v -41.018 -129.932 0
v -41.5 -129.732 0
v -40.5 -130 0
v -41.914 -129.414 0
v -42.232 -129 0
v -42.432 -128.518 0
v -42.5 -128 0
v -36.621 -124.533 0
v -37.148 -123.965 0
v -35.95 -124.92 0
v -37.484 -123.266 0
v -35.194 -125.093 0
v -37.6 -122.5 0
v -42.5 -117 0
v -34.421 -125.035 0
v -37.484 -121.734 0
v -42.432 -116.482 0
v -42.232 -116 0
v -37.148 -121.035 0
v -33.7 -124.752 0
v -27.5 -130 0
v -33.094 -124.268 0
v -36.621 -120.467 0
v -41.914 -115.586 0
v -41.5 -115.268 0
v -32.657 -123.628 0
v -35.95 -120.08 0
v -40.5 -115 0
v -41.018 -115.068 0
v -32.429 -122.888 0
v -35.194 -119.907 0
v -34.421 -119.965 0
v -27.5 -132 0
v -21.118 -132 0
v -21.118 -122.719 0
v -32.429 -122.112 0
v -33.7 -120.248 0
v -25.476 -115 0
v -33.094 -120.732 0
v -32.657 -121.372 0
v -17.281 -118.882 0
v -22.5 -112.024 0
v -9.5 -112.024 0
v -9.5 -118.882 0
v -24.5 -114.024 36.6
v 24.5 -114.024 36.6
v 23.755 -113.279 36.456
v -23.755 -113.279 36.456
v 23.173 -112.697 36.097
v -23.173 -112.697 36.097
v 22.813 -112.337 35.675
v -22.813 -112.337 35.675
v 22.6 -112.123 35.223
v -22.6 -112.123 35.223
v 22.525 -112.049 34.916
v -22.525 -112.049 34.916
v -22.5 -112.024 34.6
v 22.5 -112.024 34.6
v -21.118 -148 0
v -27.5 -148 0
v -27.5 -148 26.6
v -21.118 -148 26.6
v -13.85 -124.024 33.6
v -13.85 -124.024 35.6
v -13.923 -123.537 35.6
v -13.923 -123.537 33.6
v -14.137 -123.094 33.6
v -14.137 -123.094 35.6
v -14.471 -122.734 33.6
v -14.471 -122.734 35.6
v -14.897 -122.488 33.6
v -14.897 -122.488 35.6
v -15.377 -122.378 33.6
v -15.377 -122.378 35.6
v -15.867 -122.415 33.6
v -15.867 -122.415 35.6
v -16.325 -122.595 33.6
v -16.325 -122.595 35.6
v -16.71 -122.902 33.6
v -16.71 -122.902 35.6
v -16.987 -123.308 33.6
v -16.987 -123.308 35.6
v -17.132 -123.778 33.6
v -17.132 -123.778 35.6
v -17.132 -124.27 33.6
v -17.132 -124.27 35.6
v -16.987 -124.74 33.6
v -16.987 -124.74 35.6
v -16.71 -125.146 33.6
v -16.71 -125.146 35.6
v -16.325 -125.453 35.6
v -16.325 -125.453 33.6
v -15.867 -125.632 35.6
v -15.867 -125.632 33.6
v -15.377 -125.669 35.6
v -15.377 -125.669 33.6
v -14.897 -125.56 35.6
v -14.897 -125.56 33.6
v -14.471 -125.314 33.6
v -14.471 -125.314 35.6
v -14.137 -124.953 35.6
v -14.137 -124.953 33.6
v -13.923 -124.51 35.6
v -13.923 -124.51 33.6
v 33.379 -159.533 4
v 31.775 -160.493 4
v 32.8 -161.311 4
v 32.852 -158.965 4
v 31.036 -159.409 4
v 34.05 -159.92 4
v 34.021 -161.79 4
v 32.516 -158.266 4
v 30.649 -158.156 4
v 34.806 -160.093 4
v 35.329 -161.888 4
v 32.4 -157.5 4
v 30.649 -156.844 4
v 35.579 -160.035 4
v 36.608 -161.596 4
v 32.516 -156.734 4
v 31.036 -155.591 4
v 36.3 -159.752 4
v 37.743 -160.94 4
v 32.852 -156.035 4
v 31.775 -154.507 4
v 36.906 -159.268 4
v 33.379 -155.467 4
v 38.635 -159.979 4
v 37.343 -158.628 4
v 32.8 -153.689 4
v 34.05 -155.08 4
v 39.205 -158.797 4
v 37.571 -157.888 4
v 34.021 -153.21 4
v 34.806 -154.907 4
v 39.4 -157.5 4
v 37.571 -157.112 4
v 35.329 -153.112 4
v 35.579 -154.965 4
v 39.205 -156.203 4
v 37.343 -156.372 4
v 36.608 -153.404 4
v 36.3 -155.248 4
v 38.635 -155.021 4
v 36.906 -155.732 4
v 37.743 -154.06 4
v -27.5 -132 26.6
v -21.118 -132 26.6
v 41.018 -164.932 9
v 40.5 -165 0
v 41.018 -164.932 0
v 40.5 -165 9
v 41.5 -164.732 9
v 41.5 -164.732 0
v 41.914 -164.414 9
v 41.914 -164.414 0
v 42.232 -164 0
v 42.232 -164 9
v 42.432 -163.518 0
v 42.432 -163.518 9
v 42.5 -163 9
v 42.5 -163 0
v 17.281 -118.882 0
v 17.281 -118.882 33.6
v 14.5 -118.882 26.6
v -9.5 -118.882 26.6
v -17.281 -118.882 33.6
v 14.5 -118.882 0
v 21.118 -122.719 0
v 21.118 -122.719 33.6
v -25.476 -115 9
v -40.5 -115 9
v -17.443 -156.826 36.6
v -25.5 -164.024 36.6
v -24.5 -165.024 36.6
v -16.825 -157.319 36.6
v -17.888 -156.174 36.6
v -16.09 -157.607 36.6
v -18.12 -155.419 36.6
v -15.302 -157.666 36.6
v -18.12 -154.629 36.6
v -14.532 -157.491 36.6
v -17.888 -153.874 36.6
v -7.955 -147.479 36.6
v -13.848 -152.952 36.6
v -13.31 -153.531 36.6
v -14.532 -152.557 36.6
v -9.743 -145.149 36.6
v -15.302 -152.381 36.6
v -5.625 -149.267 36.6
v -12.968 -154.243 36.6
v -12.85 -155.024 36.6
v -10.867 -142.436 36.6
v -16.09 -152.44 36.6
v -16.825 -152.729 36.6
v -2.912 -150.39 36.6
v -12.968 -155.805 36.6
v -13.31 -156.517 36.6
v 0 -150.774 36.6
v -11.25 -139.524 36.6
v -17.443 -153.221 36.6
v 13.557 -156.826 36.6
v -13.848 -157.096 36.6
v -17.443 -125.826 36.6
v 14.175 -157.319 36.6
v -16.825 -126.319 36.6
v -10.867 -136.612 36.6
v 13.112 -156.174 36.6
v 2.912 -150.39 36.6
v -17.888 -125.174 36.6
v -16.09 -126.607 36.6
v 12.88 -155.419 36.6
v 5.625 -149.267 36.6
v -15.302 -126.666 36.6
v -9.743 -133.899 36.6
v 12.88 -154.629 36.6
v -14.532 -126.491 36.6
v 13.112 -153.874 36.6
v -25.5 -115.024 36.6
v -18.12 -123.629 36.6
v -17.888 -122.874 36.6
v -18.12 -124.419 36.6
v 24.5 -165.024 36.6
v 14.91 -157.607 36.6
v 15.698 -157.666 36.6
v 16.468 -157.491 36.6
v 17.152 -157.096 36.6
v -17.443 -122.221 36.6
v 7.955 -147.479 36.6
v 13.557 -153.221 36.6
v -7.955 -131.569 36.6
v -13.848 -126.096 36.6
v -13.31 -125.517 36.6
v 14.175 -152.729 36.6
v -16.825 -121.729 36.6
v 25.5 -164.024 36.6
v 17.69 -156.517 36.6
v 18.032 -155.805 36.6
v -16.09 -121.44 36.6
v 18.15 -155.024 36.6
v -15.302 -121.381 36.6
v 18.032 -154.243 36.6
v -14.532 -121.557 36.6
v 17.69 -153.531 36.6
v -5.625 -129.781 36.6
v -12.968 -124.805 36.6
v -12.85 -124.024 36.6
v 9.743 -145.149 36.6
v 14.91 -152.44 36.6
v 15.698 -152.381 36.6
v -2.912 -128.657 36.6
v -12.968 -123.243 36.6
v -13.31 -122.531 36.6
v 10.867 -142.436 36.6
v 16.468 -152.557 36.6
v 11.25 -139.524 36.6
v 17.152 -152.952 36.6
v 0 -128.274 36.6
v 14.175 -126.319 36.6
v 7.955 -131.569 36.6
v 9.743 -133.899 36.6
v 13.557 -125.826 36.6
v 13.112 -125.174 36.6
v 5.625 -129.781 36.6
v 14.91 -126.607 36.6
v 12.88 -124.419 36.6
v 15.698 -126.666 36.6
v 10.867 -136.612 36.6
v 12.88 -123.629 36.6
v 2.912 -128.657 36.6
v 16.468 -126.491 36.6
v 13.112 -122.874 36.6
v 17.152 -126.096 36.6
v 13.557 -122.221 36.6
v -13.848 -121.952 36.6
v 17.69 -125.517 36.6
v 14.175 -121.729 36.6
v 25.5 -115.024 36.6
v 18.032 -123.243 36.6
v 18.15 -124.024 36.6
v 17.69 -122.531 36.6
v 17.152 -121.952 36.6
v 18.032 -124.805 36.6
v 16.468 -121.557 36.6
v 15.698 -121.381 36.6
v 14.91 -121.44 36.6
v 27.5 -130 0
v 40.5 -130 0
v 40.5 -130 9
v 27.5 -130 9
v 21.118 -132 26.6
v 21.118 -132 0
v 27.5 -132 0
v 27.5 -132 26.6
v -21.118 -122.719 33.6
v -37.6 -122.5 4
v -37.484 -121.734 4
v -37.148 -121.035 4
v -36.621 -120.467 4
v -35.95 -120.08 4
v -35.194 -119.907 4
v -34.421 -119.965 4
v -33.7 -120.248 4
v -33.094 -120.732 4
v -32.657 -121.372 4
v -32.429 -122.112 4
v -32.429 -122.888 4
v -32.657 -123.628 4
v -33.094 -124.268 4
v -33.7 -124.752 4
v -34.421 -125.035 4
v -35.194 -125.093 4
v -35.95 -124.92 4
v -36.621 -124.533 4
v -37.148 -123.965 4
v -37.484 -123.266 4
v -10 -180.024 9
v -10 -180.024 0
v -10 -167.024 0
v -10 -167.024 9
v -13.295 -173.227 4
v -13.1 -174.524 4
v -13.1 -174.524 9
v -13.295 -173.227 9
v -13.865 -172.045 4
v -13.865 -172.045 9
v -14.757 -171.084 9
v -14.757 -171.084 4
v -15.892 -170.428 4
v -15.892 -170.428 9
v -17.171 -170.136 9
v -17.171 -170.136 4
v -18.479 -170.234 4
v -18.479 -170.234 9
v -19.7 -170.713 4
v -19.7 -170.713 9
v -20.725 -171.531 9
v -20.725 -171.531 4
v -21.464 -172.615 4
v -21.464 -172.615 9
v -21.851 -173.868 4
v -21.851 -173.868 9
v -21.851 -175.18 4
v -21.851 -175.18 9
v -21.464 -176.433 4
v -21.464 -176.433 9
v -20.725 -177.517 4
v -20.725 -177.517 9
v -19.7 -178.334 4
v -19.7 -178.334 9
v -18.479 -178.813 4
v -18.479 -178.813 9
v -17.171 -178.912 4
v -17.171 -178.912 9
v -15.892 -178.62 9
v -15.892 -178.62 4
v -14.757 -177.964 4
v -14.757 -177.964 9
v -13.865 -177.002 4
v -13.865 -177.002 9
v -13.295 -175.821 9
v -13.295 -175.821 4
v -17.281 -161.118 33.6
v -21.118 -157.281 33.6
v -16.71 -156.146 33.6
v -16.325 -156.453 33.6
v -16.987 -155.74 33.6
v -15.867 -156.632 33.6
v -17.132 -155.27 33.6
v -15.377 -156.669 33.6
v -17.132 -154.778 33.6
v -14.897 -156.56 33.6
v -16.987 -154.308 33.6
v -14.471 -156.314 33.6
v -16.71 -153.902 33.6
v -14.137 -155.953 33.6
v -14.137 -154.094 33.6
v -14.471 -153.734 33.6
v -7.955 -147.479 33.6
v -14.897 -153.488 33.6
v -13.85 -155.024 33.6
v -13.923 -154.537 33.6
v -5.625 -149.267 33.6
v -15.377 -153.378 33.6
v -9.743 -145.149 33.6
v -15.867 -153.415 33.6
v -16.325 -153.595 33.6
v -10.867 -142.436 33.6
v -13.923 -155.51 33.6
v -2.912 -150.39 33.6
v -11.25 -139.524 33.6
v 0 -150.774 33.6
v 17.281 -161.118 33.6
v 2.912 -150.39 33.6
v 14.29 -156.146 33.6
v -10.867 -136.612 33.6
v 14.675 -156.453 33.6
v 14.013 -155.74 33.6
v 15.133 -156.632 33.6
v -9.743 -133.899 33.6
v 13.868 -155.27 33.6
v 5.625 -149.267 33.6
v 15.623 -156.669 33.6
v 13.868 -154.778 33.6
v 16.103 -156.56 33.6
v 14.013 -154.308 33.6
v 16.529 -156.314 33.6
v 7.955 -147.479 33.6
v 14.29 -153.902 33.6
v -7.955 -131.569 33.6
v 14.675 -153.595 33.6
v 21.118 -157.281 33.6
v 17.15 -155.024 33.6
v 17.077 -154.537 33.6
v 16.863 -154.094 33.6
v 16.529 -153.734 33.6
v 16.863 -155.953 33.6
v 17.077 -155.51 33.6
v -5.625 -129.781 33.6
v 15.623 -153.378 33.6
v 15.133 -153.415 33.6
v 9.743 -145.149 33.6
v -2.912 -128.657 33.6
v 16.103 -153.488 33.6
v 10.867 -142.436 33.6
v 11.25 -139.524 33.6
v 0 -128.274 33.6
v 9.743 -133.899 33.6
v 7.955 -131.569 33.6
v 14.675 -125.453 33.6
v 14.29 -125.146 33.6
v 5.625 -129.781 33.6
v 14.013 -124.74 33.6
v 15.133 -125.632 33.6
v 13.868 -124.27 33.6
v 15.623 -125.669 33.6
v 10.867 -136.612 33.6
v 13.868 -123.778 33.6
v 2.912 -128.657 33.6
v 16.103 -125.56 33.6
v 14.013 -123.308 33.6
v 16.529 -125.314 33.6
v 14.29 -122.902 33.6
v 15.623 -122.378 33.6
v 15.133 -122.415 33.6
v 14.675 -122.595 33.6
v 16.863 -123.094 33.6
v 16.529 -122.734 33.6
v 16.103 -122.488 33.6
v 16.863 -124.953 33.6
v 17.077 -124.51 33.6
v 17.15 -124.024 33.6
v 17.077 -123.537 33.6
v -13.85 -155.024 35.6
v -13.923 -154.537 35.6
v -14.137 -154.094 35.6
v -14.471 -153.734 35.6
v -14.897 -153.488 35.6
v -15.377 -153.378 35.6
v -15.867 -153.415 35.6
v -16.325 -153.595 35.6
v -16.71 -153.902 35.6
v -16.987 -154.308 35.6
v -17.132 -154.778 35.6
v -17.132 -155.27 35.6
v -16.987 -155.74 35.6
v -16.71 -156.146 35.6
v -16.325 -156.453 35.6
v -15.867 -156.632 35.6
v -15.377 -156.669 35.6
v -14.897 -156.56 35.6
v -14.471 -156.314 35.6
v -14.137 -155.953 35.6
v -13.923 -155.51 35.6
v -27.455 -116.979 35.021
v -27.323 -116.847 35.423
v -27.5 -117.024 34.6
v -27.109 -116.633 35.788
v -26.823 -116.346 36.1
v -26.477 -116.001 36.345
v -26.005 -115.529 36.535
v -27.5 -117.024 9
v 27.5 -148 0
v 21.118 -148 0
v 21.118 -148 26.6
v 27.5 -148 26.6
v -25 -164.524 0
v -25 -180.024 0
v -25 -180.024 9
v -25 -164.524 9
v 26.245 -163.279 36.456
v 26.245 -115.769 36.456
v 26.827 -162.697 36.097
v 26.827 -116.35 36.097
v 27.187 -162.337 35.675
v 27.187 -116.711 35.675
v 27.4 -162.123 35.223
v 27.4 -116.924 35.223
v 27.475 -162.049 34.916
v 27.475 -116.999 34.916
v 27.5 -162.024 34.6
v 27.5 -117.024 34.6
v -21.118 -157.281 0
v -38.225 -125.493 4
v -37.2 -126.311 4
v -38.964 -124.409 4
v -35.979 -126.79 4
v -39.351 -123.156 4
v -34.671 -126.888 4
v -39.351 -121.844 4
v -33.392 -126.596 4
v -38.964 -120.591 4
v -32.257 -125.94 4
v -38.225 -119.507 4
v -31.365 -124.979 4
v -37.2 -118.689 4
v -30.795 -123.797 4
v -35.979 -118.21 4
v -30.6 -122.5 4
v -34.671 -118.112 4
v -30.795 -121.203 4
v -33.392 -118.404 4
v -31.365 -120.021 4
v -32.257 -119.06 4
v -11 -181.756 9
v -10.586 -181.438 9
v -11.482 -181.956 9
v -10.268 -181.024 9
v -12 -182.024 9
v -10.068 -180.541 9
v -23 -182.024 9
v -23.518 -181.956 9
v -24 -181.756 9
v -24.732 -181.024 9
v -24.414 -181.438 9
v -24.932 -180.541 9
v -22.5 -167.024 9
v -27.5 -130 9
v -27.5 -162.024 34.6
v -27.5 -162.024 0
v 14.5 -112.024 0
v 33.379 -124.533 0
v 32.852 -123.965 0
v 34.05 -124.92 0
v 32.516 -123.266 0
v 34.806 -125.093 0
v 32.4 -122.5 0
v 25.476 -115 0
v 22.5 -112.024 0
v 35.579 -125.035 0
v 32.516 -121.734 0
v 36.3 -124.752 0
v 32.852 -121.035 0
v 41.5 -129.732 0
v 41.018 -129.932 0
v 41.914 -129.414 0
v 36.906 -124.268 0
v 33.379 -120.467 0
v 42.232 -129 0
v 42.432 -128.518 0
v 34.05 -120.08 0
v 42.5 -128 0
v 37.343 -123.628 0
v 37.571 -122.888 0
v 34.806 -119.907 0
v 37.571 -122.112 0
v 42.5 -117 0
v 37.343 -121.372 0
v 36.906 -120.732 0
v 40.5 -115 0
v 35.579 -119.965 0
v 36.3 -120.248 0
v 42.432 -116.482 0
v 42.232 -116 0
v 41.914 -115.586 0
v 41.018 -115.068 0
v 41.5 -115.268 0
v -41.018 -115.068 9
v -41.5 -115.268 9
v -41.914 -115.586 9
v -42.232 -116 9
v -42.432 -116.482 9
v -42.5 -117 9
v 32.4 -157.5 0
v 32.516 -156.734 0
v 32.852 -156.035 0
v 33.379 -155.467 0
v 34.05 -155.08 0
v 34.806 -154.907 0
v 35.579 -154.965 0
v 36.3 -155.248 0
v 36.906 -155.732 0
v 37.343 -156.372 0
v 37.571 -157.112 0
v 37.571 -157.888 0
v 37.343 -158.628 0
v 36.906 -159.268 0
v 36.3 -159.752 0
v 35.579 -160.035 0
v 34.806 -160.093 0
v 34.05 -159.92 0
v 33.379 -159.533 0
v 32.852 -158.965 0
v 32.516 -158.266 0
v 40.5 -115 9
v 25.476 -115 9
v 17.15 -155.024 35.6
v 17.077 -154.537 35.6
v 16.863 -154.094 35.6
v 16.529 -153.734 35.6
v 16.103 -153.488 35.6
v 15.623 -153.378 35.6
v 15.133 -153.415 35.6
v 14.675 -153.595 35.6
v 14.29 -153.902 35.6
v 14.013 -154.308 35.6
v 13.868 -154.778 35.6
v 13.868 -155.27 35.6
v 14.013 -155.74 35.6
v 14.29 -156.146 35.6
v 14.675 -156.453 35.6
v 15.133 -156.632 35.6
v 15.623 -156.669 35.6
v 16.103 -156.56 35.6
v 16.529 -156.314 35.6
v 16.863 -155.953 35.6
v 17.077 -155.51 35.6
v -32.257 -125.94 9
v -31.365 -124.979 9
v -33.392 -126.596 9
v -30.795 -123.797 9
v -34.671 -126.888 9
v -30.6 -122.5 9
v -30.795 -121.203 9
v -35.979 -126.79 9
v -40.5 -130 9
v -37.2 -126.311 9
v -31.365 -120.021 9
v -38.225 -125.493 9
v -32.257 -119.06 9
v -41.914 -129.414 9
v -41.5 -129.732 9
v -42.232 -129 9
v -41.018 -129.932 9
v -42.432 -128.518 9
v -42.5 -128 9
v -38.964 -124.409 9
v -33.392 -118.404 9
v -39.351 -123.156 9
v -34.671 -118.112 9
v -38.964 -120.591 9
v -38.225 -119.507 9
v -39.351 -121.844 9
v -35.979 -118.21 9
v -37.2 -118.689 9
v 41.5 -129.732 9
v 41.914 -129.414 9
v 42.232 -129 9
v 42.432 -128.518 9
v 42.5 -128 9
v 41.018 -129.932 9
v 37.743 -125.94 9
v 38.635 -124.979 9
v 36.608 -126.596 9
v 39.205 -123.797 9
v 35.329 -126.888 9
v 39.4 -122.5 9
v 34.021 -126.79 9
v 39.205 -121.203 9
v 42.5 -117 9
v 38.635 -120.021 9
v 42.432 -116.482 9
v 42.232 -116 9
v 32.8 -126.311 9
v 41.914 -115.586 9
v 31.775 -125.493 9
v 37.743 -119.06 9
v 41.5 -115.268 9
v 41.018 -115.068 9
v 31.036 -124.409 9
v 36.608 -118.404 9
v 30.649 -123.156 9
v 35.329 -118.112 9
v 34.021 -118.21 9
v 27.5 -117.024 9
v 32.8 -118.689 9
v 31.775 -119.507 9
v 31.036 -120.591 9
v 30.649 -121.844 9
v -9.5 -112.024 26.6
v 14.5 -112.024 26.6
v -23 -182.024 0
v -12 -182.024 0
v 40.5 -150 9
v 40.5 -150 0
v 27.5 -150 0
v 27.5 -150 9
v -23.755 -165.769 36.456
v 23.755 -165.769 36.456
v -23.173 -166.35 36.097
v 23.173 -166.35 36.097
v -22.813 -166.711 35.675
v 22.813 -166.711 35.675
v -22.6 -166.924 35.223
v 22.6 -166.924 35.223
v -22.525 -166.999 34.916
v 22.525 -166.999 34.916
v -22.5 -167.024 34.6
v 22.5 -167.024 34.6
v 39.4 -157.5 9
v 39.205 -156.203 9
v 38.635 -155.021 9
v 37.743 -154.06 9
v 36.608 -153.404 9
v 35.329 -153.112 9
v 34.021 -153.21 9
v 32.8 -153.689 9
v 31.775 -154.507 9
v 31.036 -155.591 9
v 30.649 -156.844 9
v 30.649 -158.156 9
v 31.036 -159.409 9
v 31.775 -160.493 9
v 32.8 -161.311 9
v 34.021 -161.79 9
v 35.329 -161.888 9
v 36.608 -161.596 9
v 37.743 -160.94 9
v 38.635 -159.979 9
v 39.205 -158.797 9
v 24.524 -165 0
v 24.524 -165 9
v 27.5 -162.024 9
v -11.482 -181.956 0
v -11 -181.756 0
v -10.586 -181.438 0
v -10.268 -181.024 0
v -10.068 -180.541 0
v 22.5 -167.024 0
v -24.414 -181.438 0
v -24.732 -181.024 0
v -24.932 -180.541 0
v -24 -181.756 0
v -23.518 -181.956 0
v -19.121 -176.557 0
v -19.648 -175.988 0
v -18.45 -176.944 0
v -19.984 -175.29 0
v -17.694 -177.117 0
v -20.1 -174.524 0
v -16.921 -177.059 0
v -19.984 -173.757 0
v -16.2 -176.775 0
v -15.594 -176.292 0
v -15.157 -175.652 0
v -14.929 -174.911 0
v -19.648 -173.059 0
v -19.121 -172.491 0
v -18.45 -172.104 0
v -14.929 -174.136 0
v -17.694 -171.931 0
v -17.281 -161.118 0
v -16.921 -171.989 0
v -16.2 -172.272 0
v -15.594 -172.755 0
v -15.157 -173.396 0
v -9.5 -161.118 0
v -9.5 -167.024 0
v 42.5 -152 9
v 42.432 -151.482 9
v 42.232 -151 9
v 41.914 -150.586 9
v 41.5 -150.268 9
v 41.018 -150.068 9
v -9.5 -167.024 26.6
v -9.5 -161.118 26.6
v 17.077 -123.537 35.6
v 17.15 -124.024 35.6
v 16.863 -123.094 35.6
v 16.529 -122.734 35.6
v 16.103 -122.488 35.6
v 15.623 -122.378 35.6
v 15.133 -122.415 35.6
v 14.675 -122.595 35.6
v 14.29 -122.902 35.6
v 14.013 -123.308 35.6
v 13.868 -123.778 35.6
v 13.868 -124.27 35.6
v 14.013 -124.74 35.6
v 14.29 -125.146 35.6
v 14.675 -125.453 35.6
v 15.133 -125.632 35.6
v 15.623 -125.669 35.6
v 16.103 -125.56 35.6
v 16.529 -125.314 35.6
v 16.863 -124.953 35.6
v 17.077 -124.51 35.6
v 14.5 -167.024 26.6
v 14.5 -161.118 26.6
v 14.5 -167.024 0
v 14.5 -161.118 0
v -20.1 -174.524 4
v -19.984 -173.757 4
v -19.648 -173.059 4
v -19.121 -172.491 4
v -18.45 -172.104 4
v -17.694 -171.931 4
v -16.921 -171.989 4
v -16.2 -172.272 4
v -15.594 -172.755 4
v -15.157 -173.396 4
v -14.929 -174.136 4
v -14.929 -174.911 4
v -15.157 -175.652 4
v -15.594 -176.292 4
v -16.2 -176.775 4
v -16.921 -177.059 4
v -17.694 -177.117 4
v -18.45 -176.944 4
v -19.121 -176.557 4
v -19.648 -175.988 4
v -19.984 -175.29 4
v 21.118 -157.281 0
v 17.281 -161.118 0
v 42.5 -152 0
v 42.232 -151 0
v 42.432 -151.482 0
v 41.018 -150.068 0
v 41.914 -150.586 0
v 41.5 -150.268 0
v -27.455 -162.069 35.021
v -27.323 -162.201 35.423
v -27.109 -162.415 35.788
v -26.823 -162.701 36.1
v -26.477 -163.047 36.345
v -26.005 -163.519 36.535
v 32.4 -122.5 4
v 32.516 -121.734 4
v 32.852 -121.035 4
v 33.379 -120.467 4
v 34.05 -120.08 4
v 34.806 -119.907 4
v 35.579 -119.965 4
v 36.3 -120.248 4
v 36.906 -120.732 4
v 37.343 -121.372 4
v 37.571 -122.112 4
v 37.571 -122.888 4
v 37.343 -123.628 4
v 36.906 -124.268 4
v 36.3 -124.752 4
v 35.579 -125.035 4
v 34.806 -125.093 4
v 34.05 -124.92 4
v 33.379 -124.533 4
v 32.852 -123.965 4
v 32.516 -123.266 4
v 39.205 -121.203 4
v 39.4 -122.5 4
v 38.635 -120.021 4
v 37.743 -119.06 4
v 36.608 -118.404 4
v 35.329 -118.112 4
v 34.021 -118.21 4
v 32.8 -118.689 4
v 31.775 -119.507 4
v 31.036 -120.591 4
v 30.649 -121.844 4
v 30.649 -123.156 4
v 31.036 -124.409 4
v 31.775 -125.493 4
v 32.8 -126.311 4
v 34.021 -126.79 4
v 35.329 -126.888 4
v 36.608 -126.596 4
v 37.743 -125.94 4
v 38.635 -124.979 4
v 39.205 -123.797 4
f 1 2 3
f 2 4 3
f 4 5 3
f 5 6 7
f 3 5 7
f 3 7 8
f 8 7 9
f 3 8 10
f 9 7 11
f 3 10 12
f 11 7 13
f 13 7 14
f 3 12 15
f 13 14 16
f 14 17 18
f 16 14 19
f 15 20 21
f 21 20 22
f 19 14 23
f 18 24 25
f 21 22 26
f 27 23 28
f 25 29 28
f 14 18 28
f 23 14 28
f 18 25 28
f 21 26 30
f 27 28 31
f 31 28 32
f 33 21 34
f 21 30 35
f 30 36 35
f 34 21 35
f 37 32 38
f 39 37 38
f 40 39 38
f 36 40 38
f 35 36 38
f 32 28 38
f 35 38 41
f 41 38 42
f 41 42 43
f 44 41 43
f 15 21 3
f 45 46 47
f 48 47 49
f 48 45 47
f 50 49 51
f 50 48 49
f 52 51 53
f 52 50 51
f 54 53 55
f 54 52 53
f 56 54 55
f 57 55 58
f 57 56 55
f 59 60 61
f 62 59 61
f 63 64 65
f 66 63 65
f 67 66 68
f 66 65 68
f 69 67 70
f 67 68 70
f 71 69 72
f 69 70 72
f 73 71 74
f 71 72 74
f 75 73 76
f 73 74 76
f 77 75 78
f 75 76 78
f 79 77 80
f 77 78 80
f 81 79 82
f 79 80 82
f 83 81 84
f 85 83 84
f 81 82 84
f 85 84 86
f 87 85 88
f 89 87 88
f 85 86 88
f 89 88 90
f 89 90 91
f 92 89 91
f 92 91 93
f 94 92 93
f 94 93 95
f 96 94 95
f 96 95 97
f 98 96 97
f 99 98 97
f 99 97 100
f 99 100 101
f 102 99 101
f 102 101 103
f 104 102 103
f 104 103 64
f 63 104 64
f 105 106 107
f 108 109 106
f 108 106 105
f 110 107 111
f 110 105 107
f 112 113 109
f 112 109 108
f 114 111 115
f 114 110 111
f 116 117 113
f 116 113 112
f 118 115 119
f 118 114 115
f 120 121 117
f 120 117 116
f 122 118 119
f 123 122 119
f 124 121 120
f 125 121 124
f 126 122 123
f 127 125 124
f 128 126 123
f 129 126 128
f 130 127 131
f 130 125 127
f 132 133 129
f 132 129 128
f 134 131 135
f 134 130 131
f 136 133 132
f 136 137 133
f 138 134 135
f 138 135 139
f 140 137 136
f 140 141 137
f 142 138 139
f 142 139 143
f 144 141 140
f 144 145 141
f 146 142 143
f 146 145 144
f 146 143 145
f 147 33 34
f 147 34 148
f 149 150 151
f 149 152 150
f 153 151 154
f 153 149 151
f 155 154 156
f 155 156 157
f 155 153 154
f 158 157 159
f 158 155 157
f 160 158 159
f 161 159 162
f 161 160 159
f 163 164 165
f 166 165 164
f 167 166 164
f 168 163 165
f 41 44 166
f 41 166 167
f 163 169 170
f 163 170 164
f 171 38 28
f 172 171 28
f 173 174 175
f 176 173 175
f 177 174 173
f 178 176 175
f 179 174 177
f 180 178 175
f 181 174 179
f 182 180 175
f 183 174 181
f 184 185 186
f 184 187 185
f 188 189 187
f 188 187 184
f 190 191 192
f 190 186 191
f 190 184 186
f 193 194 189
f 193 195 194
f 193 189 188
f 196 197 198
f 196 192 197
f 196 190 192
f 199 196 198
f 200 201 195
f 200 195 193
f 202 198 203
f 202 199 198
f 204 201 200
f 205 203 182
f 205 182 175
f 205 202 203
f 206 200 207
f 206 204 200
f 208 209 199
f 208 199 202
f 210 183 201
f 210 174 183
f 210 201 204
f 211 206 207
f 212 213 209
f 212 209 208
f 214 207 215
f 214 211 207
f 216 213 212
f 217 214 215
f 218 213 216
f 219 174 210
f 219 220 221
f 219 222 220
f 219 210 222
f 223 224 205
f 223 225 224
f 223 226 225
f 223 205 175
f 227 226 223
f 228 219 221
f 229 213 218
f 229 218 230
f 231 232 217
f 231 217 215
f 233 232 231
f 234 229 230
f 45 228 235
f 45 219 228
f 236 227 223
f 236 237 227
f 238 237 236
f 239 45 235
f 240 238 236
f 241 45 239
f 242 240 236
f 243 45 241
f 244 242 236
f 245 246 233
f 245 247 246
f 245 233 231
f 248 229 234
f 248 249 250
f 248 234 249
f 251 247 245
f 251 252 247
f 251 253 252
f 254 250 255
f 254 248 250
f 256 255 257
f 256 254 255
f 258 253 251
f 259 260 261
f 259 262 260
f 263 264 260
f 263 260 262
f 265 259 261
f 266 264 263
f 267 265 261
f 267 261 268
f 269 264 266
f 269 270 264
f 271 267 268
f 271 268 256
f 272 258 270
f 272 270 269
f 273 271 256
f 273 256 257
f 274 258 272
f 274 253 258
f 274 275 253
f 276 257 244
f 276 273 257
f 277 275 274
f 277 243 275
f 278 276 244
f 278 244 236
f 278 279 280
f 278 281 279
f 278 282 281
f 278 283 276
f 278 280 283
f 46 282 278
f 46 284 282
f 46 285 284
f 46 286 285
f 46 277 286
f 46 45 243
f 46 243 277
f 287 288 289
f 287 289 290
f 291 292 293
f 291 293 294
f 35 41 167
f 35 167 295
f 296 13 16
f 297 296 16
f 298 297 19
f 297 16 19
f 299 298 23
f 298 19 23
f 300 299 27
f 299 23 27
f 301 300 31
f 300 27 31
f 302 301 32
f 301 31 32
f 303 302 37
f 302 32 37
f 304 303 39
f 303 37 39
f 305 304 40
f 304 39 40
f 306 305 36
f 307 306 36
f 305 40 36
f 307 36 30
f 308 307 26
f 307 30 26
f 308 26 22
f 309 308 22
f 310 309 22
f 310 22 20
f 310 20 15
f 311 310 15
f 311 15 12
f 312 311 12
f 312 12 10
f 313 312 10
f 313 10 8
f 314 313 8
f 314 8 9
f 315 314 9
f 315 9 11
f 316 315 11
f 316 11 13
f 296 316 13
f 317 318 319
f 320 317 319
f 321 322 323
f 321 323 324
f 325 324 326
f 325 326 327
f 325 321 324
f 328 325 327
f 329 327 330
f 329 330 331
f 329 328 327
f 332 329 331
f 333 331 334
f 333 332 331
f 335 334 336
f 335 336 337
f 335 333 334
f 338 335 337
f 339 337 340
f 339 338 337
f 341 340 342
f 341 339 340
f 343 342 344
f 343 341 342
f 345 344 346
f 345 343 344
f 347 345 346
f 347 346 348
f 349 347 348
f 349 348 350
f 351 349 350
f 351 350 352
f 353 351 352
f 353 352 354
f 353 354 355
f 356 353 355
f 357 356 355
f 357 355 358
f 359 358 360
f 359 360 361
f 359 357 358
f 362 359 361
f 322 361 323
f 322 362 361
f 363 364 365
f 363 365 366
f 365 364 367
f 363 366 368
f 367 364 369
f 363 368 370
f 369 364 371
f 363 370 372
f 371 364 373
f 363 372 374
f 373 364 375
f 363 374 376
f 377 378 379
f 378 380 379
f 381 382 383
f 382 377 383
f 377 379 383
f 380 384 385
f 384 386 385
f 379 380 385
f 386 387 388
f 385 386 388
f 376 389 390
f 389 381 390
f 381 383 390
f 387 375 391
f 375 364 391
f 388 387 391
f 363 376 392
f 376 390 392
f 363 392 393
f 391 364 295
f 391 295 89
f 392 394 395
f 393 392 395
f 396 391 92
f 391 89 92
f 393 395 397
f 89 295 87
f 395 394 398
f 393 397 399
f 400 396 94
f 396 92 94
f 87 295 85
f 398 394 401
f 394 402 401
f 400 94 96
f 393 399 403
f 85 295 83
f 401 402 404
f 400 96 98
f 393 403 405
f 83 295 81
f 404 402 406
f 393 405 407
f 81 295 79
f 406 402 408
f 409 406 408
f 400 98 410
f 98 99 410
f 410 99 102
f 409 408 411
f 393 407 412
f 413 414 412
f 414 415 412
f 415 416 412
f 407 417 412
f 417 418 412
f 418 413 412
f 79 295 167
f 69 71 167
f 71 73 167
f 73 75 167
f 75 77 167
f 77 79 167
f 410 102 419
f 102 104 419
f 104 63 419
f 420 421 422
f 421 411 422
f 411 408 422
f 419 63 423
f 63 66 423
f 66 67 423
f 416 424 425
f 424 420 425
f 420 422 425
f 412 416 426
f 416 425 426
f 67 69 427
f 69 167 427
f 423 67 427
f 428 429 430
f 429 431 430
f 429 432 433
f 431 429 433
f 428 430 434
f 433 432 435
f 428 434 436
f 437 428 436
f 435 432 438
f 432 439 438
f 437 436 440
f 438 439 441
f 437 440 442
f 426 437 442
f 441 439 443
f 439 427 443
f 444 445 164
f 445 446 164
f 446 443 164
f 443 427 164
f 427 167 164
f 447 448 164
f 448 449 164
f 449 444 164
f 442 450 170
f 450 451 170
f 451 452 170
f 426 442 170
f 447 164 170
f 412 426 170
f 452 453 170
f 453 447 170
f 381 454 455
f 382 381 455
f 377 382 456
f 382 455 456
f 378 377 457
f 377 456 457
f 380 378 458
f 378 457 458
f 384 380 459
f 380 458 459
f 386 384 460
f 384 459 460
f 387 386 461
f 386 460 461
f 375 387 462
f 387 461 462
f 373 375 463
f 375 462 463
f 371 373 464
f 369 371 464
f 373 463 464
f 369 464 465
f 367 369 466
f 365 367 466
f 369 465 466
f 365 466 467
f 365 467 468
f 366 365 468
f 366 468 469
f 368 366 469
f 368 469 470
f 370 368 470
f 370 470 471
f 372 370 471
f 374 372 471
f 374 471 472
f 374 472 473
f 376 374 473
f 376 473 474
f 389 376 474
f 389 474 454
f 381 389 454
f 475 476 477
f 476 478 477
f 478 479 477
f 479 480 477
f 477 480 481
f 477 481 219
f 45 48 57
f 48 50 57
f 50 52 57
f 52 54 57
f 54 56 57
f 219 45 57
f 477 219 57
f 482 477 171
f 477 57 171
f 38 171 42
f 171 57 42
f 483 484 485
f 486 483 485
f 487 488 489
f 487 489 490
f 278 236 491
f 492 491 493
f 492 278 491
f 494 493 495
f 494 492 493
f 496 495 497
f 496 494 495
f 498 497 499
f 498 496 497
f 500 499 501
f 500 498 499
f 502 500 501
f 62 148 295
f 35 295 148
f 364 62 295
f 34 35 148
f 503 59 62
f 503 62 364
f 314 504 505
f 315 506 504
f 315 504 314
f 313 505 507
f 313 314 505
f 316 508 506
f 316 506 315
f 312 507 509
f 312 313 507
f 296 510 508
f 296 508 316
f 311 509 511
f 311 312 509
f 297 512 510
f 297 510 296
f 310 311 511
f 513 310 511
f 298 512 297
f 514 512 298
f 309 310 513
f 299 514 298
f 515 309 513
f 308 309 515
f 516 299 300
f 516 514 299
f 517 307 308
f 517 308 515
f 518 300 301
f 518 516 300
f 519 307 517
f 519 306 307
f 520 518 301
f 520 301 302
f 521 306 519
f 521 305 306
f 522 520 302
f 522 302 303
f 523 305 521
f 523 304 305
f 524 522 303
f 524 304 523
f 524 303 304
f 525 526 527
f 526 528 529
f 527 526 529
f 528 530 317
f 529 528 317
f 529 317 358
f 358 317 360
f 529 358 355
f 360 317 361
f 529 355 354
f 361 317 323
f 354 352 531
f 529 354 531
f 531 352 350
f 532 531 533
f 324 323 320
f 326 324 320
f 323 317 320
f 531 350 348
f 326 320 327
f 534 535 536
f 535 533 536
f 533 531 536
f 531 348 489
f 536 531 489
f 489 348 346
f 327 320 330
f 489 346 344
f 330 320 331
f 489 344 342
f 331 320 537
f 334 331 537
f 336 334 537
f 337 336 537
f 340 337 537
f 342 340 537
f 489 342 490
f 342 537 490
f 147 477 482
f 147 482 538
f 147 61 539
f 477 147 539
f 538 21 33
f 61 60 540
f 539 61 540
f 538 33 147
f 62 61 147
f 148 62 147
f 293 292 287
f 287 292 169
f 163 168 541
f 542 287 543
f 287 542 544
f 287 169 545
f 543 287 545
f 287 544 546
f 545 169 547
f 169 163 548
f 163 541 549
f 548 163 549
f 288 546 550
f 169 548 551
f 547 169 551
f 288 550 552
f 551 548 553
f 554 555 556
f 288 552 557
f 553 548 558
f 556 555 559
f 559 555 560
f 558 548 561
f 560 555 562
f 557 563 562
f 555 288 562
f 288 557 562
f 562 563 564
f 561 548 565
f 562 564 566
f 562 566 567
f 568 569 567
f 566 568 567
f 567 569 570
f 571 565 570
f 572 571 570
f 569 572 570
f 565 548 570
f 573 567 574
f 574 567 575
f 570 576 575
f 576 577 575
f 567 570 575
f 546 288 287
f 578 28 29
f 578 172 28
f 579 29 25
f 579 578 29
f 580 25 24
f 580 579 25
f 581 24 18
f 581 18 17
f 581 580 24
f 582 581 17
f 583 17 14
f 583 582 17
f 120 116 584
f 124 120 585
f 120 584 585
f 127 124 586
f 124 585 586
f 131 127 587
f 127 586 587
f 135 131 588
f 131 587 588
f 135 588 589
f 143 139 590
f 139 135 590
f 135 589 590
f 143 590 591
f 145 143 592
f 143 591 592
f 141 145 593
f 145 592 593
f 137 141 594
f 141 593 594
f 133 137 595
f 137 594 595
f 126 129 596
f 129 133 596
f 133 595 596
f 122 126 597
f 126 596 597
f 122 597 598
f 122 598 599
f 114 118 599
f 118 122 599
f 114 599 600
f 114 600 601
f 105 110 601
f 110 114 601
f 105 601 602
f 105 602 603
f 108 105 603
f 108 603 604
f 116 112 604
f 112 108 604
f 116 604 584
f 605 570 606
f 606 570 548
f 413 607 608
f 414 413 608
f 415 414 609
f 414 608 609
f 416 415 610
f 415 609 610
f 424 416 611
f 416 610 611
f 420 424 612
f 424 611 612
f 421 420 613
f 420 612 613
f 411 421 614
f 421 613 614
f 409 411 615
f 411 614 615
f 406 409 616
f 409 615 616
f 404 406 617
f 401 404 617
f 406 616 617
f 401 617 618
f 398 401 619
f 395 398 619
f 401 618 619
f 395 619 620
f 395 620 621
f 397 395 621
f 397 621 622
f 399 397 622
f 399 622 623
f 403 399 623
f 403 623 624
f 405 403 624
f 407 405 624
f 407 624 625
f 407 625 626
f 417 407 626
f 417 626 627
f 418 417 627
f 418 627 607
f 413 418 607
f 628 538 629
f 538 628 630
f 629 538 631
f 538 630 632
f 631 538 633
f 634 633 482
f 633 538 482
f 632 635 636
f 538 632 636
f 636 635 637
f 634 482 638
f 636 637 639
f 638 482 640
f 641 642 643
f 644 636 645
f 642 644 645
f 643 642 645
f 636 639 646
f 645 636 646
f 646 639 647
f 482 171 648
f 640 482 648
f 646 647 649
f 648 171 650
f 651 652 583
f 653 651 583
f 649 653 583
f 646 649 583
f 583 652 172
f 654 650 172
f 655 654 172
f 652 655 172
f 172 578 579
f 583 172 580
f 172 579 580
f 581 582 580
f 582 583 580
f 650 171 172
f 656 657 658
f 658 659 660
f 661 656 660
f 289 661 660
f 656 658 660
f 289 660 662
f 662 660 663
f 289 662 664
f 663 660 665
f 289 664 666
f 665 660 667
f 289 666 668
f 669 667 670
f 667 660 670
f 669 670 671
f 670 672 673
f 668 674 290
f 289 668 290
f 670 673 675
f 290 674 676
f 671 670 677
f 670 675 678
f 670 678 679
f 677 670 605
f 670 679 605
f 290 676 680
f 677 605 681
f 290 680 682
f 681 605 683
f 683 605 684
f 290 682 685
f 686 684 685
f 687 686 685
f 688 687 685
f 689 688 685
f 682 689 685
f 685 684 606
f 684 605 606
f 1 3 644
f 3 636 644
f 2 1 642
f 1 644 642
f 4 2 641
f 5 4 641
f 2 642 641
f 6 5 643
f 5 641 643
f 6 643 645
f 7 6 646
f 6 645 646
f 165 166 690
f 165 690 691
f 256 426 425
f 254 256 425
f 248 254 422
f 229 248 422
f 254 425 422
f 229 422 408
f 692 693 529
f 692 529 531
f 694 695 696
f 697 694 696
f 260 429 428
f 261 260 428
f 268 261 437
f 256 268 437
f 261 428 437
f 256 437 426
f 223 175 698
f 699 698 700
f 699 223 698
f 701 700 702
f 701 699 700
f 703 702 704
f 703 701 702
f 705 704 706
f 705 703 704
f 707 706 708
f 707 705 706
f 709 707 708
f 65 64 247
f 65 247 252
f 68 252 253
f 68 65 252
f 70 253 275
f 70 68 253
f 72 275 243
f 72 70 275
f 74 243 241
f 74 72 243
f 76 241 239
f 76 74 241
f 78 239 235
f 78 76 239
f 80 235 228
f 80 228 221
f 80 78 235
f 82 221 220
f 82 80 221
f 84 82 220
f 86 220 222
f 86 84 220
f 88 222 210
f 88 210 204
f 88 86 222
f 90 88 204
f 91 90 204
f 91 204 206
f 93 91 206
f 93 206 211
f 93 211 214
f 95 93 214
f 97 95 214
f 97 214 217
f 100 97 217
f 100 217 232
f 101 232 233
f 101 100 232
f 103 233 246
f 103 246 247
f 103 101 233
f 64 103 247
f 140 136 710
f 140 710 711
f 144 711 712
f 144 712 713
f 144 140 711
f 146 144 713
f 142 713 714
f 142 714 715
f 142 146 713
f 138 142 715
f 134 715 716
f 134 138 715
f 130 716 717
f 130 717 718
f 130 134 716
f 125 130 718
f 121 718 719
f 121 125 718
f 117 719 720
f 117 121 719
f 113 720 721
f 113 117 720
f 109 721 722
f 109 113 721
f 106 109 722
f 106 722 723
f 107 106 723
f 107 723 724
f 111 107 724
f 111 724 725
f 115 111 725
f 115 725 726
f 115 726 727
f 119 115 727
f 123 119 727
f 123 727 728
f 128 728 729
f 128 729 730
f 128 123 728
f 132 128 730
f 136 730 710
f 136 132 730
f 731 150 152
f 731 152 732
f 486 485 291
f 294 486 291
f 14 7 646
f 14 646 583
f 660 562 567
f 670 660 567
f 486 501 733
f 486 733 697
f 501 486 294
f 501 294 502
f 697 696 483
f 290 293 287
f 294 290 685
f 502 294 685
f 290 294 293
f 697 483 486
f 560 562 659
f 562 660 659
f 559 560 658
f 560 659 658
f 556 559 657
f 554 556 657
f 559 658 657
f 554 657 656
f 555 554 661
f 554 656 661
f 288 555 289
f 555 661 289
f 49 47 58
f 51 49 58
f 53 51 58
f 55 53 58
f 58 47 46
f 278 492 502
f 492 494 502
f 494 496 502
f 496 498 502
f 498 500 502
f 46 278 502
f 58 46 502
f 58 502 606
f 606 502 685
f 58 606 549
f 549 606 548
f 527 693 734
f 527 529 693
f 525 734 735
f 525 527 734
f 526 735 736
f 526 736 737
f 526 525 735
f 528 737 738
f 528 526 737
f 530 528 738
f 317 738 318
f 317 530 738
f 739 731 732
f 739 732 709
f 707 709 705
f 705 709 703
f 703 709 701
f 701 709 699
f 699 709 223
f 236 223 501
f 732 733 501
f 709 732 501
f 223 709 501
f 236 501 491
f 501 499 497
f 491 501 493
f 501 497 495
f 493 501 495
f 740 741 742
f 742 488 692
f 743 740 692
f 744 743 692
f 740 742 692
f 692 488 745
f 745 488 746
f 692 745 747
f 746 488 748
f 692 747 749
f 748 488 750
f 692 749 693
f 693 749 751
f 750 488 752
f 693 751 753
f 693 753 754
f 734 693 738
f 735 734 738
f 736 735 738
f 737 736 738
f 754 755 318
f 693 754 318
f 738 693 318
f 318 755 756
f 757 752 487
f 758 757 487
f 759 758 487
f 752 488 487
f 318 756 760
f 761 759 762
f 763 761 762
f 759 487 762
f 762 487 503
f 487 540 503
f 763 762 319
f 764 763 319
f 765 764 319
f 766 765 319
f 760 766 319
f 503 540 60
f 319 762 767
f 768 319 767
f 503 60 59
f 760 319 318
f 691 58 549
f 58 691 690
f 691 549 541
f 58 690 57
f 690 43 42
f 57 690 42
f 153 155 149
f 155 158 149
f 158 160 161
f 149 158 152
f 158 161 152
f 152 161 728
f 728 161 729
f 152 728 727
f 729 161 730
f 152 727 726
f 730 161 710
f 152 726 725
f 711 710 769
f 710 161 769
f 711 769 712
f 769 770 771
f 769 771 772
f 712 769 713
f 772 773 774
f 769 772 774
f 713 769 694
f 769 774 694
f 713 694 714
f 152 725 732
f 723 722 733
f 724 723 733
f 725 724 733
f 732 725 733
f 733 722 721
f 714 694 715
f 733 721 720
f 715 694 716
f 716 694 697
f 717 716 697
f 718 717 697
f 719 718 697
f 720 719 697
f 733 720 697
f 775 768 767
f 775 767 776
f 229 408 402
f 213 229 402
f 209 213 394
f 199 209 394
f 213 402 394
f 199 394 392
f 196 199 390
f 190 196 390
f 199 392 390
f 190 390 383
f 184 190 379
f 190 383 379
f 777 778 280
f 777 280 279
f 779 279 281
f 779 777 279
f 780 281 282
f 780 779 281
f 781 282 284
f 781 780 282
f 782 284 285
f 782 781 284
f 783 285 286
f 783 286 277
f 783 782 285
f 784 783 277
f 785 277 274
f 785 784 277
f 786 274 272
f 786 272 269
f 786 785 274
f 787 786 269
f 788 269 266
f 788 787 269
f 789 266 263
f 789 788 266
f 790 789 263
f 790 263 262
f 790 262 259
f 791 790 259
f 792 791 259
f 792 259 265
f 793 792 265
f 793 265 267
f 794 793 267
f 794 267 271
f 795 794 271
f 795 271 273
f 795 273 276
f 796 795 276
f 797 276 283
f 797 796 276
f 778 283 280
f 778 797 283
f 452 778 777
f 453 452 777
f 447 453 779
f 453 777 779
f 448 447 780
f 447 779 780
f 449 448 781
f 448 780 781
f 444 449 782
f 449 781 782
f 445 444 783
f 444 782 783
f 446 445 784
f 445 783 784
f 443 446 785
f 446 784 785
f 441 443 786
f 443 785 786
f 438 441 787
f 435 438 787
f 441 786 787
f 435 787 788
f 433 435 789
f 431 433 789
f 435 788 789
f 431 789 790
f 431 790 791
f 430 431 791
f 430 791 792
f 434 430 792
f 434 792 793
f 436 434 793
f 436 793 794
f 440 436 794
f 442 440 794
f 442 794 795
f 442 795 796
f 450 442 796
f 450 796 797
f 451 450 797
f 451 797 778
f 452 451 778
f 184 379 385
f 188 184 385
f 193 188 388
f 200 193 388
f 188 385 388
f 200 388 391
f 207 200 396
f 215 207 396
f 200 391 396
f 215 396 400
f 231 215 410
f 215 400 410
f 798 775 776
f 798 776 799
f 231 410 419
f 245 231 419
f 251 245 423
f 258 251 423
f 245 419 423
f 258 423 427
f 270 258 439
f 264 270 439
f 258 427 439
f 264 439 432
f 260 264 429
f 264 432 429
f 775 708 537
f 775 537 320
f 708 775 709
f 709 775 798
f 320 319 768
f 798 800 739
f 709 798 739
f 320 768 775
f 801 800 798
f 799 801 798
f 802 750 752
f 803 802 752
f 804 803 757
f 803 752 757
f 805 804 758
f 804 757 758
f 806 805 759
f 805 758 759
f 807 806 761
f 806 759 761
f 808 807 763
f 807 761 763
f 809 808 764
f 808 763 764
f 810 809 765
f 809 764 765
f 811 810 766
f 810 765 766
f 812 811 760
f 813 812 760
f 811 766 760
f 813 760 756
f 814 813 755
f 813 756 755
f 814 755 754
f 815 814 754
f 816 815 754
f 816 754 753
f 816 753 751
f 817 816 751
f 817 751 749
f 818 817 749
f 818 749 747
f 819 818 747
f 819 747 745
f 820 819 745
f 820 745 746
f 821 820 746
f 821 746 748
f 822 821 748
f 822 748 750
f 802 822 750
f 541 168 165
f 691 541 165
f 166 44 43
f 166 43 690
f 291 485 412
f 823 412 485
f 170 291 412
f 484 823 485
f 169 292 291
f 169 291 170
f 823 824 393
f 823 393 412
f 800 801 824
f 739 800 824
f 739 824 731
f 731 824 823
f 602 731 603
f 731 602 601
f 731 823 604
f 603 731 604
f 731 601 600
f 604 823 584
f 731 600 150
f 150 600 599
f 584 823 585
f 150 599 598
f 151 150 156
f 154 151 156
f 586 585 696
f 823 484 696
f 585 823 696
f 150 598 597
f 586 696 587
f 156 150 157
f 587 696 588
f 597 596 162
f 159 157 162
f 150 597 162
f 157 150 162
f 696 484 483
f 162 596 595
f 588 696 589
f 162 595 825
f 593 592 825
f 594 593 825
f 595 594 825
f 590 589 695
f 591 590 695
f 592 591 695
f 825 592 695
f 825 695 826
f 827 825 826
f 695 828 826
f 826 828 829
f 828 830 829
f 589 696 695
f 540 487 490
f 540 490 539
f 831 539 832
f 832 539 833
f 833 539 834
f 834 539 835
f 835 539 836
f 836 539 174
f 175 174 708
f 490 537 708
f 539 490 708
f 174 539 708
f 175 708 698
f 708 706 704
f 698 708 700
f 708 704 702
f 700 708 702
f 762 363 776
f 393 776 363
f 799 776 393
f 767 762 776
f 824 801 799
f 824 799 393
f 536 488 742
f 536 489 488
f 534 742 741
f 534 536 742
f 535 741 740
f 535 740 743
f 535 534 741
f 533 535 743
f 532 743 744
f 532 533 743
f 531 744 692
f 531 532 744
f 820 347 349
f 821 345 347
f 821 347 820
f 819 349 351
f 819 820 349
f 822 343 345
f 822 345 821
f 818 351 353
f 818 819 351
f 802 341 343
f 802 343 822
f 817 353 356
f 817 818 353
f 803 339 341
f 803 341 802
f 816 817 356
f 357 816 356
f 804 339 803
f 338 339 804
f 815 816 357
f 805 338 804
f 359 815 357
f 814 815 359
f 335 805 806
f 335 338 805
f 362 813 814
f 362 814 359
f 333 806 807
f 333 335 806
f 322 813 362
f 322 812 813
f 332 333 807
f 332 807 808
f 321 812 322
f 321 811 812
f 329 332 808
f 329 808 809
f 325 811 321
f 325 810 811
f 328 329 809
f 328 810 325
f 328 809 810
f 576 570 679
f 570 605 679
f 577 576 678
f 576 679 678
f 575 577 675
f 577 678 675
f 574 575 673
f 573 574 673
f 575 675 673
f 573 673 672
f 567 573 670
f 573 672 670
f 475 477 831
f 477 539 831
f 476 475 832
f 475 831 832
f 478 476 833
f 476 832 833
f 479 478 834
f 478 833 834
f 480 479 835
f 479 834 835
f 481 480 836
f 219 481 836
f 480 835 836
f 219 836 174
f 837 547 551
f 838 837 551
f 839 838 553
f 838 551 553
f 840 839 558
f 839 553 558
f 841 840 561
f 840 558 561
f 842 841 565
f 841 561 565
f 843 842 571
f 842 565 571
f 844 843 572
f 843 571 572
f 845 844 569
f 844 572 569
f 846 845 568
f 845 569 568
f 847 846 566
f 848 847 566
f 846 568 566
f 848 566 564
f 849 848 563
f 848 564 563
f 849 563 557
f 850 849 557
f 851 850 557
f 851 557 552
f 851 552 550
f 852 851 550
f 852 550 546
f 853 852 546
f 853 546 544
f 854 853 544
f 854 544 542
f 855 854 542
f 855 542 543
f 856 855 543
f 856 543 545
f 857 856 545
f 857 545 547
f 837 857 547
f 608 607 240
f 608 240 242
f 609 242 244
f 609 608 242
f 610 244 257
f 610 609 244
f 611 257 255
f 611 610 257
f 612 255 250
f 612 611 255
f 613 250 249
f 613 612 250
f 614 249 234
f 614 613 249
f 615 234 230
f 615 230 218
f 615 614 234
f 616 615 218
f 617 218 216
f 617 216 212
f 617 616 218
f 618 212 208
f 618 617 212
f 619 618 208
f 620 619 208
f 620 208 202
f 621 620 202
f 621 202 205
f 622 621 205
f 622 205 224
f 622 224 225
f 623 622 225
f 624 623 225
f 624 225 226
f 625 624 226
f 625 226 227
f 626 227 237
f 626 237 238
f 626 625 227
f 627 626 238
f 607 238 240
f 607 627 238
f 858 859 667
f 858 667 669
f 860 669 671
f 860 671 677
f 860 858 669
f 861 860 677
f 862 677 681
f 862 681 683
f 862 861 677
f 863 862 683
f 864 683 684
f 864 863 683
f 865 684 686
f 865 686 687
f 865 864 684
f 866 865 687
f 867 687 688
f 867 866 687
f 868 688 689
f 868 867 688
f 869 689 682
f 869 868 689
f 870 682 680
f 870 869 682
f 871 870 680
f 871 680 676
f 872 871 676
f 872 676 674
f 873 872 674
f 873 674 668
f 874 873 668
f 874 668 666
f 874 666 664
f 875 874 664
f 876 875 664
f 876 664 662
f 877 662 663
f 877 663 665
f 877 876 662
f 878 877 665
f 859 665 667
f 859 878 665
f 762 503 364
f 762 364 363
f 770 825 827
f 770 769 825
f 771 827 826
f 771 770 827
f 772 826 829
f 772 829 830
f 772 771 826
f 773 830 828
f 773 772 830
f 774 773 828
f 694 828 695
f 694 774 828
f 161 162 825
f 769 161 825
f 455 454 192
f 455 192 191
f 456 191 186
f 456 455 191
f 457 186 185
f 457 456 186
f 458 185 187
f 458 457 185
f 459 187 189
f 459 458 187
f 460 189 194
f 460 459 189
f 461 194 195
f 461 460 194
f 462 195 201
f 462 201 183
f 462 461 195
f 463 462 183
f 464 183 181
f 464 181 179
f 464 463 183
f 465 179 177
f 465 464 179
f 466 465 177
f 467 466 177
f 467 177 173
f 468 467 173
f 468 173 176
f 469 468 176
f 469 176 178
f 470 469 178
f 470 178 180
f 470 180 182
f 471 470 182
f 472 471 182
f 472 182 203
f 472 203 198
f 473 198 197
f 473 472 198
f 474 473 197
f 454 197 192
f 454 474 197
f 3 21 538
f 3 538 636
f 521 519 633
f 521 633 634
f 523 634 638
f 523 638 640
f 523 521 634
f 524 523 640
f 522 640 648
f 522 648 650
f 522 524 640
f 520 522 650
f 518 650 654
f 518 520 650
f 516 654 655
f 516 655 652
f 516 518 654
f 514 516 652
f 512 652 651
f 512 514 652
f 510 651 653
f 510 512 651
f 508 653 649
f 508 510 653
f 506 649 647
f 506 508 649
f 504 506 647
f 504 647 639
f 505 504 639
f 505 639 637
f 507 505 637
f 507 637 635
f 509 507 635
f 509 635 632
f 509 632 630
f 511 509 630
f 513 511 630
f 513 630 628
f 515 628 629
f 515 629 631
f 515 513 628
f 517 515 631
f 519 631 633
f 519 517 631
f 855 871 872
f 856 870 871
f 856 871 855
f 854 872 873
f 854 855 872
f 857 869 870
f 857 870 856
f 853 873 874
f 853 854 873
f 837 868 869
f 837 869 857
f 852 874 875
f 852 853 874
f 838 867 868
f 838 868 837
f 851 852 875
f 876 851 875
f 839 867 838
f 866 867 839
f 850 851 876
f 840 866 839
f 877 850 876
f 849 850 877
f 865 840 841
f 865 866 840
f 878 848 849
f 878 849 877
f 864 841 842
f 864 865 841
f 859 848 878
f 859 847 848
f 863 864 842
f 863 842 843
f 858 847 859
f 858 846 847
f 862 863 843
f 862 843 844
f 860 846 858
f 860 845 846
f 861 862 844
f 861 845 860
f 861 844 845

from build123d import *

# Parameters (mm, degrees)
SKETCH2_W           = 55
SKETCH2_H           = 55
BOSS_EXTRUDE1_DEPTH = 33.6
BOSS_EXTRUDE2_DEPTH = 3
SKETCH4_W           = 15
SKETCH4_H           = 15
SKETCH4_R           = 2.6
BOSS_EXTRUDE3_DEPTH = 9
CUT_EXTRUDE1_START  = -5
SKETCH6_R           = 4.4
SKETCH6_R_2         = 2.6
CUT_EXTRUDE1_DEPTH  = 5
CHAMFER1_SIZE       = 5
FILLET4_R           = 2
SKETCH7_W           = 24
SKETCH7_H           = 26.6
CUT_EXTRUDE2_DEPTH  = 67
SKETCH8_W           = 26.6
SKETCH8_H           = 16
CUT_EXTRUDE3_DEPTH  = 67
SKETCH10_R          = 1.65
CUT_EXTRUDE4_DEPTH  = 10
CHAMFER2_SIZE       = 1


with BuildPart() as part:
    # Sketch2 → Boss-Extrude1 (new body)
    with BuildSketch(Plane.XY):
        with Locations((0, 0.476186899)):
            Rectangle(SKETCH2_W, SKETCH2_H)
        Polygon((21.118377871, -17.280631787), (21.118377871, 17.280631787), (17.280631787, 21.118377871), (-17.280631787, 21.118377871), (-21.118377871, 17.280631787), (-21.118377871, -17.280631787), (-17.280631787, -21.118377871), (17.280631787, -21.118377871), align=None, mode=Mode.SUBTRACT)
    extrude(amount=BOSS_EXTRUDE1_DEPTH)

    # Sketch3 → Boss-Extrude2 (add)
    with BuildSketch(Plane.XY.offset(33.6)):
        with BuildLine():
            Line((-7.954951288, 8.431138187), (-18.961411379, 19.437598278))
            Line((-18.961411379, 19.437598278), (-21.118377871, 17.280631787))
            Line((-21.118377871, 17.280631787), (-21.118377871, -17.280631787))
            Line((-21.118377871, -17.280631787), (-19.437598278, -18.961411379))
            Line((-19.437598278, -18.961411379), (-7.954951288, -7.478764389))
            ThreePointArc((-7.954951288, -7.478764389), (-11.25, 0.476186899), (-7.954951288, 8.431138187))
        make_face()
        with BuildLine():
            Line((-7.954951288, -7.478764389), (-19.437598278, -18.961411379))
            Line((-19.437598278, -18.961411379), (-17.280631787, -21.118377871))
            Line((-17.280631787, -21.118377871), (17.280631787, -21.118377871))
            Line((17.280631787, -21.118377871), (19.437598278, -18.961411379))
            Line((19.437598278, -18.961411379), (7.954951288, -7.478764389))
            ThreePointArc((7.954951288, -7.478764389), (0, -10.773813101), (-7.954951288, -7.478764389))
        make_face()
        with BuildLine():
            Line((21.118377871, 17.280631787), (18.961411379, 19.437598278))
            Line((18.961411379, 19.437598278), (7.954951288, 8.431138187))
            ThreePointArc((7.954951288, 8.431138187), (10.393644741, 4.781375513), (11.25, 0.476186899))
            ThreePointArc((11.25, 0.476186899), (10.393644741, -3.829001715), (7.954951288, -7.478764389))
            Line((7.954951288, -7.478764389), (19.437598278, -18.961411379))
            Line((19.437598278, -18.961411379), (21.118377871, -17.280631787))
            Line((21.118377871, -17.280631787), (21.118377871, 17.280631787))
        make_face()
        with BuildLine():
            Line((-17.280631787, 21.118377871), (-18.961411379, 19.437598278))
            Line((-18.961411379, 19.437598278), (-7.954951288, 8.431138187))
            ThreePointArc((-7.954951288, 8.431138187), (0, 11.726186899), (7.954951288, 8.431138187))
            Line((7.954951288, 8.431138187), (18.961411379, 19.437598278))
            Line((18.961411379, 19.437598278), (17.280631787, 21.118377871))
            Line((17.280631787, 21.118377871), (-17.280631787, 21.118377871))
        make_face()
        Polygon((-18.961411379, 19.437598278), (-27.5, 27.976186899), (-27.5, -27.023813101), (-19.437598278, -18.961411379), (-21.118377871, -17.280631787), (-21.118377871, 17.280631787), align=None)
        Polygon((-19.437598278, -18.961411379), (-27.5, -27.023813101), (27.5, -27.023813101), (19.437598278, -18.961411379), (17.280631787, -21.118377871), (-17.280631787, -21.118377871), align=None)
        Polygon((27.5, -27.023813101), (27.5, 27.976186899), (18.961411379, 19.437598278), (21.118377871, 17.280631787), (21.118377871, -17.280631787), (19.437598278, -18.961411379), align=None)
        Polygon((27.5, 27.976186899), (-27.5, 27.976186899), (-18.961411379, 19.437598278), (-17.280631787, 21.118377871), (17.280631787, 21.118377871), (18.961411379, 19.437598278), align=None)
    extrude(amount=BOSS_EXTRUDE2_DEPTH)

    # Sketch4 → Boss-Extrude3 (add)
    # profile 1 of 4: a face of its own
    with BuildSketch(Plane(origin=(0, 0, 0), x_dir=(-1, 0, 0), z_dir=(0, 0, -1))):
        with Locations((-35, 17.5)):
            Rectangle(SKETCH4_W, SKETCH4_H)
        with Locations((-35, 17.5)):
            Circle(SKETCH4_R, mode=Mode.SUBTRACT)
    # profile 2 of 4: a face of its own
    with BuildSketch(Plane(origin=(0, 0, 0), x_dir=(-1, 0, 0), z_dir=(0, 0, -1))):
        with Locations((35, 17.5)):
            Rectangle(SKETCH4_W, SKETCH4_H)
        with Locations((35, 17.5)):
            Circle(SKETCH4_R, mode=Mode.SUBTRACT)
    # profile 3 of 4: a face of its own
    with BuildSketch(Plane(origin=(0, 0, 0), x_dir=(-1, 0, 0), z_dir=(0, 0, -1))):
        with Locations((-35, -17.5)):
            Rectangle(SKETCH4_W, SKETCH4_H)
        with Locations((-35, -17.5)):
            Circle(SKETCH4_R, mode=Mode.SUBTRACT)
    # profile 4 of 4: a face of its own
    with BuildSketch(Plane(origin=(0, 0, 0), x_dir=(-1, 0, 0), z_dir=(0, 0, -1))):
        with Locations((17.5, -34.523813101)):
            Rectangle(SKETCH4_W, SKETCH4_H)
        with Locations((17.5, -34.523813101)):
            Circle(SKETCH4_R, mode=Mode.SUBTRACT)
    extrude(amount=-BOSS_EXTRUDE3_DEPTH)

    # Sketch6 → Cut-Extrude1 (cut)
    # profile 1 of 4: a face of its own
    with BuildSketch(Plane.XY.offset(9).offset(CUT_EXTRUDE1_START)):
        with Locations((-17.5, -34.523813101)):
            Circle(SKETCH6_R)
    # profile 2 of 4: a face of its own
    with BuildSketch(Plane.XY.offset(9).offset(CUT_EXTRUDE1_START)):
        with Locations((-35, 17.5)):
            Circle(SKETCH6_R)
    # profile 3 of 4: a face of its own
    with BuildSketch(Plane.XY.offset(9).offset(CUT_EXTRUDE1_START)):
        with Locations((35, -17.5)):
            Circle(SKETCH6_R)
        with Locations(Location((35, -17.5, 0), (0, 0, 180))):
            Circle(SKETCH6_R_2, mode=Mode.SUBTRACT)
    # profile 4 of 4: a face of its own
    with BuildSketch(Plane.XY.offset(9).offset(CUT_EXTRUDE1_START)):
        with Locations((35, 17.5)):
            Circle(SKETCH6_R)
    extrude(amount=CUT_EXTRUDE1_DEPTH, mode=Mode.SUBTRACT)

    # Chamfer1
    chamfer1_edges = [part.edges().sort_by_distance(p)[0] for p in [
        (27.5, -27.023813101, 18.3),
        (-27.5, -27.023813101, 18.3),
        (27.5, 27.976186899, 18.3),
        (-27.5, 27.976186899, 18.3),
    ]]
    chamfer(chamfer1_edges, length=CHAMFER1_SIZE)

    # Fillet4
    fillet4_edges = [part.edges().sort_by_distance(p)[0] for p in [
        (0, 27.976186899, 36.6),
        (27.5, 0.476186899, 36.6),
        (0, -27.023813101, 36.6),
        (-27.5, 0.476186899, 36.6),
        (-25, -42.023813101, 4.5),
        (-10, -42.023813101, 4.5),
        (-42.5, 10, 4.5),
        (-42.5, 25, 4.5),
        (42.5, -25, 4.5),
        (42.5, -10, 4.5),
        (42.5, 10, 4.5),
        (42.5, 25, 4.5),
    ]]
    fillet(fillet4_edges, radius=FILLET4_R)

    # Sketch7 → Cut-Extrude2 (cut)
    with BuildSketch(Plane.XZ.offset(27.023813101)):
        with Locations((2.5, 13.3)):
            Rectangle(SKETCH7_W, SKETCH7_H)
    extrude(amount=-CUT_EXTRUDE2_DEPTH, mode=Mode.SUBTRACT)

    # Sketch8 → Cut-Extrude3 (cut)
    with BuildSketch(Plane.ZY.offset(27.5)):
        with Locations((13.3, 0)):
            Rectangle(SKETCH8_W, SKETCH8_H)
    extrude(amount=-CUT_EXTRUDE3_DEPTH, mode=Mode.SUBTRACT)


with BuildPart() as body_2:
    # Mirror2: mirrored copy
    add(part.part.mirror(Plane(origin=(-25, -42.023813101, 9), x_dir=(0, 0, 1), z_dir=(0, 1, 0))))


with BuildPart() as body_2_2:
    # Mirror3: mirrored copy
    add(body_2.part.mirror(Plane(origin=(-1.737426519, -112.023813101, 20.07988243), x_dir=(0, 0, 1), z_dir=(0, -1, 0))))

    # Sketch10 → Cut-Extrude4 (cut)
    with BuildSketch(Plane.XY.offset(36.6)):
        with Locations((-15.5, -124.023813101)):
            Circle(SKETCH10_R)
        with Locations((15.5, -124.023813101)):
            Circle(SKETCH10_R)
        with Locations((15.5, -155.023813101)):
            Circle(SKETCH10_R)
        with Locations((-15.5, -155.023813101)):
            Circle(SKETCH10_R)
    extrude(amount=-CUT_EXTRUDE4_DEPTH, mode=Mode.SUBTRACT)

    # Chamfer2
    chamfer2_edges = [body_2_2.edges().sort_by_distance(p)[0] for p in [
        (-17.15, -155.023813101, 36.6),
        (13.85, -155.023813101, 36.6),
        (13.85, -124.023813101, 36.6),
        (-17.15, -124.023813101, 36.6),
    ]]
    chamfer(chamfer2_edges, length=CHAMFER2_SIZE)


solid = body_2_2.part
